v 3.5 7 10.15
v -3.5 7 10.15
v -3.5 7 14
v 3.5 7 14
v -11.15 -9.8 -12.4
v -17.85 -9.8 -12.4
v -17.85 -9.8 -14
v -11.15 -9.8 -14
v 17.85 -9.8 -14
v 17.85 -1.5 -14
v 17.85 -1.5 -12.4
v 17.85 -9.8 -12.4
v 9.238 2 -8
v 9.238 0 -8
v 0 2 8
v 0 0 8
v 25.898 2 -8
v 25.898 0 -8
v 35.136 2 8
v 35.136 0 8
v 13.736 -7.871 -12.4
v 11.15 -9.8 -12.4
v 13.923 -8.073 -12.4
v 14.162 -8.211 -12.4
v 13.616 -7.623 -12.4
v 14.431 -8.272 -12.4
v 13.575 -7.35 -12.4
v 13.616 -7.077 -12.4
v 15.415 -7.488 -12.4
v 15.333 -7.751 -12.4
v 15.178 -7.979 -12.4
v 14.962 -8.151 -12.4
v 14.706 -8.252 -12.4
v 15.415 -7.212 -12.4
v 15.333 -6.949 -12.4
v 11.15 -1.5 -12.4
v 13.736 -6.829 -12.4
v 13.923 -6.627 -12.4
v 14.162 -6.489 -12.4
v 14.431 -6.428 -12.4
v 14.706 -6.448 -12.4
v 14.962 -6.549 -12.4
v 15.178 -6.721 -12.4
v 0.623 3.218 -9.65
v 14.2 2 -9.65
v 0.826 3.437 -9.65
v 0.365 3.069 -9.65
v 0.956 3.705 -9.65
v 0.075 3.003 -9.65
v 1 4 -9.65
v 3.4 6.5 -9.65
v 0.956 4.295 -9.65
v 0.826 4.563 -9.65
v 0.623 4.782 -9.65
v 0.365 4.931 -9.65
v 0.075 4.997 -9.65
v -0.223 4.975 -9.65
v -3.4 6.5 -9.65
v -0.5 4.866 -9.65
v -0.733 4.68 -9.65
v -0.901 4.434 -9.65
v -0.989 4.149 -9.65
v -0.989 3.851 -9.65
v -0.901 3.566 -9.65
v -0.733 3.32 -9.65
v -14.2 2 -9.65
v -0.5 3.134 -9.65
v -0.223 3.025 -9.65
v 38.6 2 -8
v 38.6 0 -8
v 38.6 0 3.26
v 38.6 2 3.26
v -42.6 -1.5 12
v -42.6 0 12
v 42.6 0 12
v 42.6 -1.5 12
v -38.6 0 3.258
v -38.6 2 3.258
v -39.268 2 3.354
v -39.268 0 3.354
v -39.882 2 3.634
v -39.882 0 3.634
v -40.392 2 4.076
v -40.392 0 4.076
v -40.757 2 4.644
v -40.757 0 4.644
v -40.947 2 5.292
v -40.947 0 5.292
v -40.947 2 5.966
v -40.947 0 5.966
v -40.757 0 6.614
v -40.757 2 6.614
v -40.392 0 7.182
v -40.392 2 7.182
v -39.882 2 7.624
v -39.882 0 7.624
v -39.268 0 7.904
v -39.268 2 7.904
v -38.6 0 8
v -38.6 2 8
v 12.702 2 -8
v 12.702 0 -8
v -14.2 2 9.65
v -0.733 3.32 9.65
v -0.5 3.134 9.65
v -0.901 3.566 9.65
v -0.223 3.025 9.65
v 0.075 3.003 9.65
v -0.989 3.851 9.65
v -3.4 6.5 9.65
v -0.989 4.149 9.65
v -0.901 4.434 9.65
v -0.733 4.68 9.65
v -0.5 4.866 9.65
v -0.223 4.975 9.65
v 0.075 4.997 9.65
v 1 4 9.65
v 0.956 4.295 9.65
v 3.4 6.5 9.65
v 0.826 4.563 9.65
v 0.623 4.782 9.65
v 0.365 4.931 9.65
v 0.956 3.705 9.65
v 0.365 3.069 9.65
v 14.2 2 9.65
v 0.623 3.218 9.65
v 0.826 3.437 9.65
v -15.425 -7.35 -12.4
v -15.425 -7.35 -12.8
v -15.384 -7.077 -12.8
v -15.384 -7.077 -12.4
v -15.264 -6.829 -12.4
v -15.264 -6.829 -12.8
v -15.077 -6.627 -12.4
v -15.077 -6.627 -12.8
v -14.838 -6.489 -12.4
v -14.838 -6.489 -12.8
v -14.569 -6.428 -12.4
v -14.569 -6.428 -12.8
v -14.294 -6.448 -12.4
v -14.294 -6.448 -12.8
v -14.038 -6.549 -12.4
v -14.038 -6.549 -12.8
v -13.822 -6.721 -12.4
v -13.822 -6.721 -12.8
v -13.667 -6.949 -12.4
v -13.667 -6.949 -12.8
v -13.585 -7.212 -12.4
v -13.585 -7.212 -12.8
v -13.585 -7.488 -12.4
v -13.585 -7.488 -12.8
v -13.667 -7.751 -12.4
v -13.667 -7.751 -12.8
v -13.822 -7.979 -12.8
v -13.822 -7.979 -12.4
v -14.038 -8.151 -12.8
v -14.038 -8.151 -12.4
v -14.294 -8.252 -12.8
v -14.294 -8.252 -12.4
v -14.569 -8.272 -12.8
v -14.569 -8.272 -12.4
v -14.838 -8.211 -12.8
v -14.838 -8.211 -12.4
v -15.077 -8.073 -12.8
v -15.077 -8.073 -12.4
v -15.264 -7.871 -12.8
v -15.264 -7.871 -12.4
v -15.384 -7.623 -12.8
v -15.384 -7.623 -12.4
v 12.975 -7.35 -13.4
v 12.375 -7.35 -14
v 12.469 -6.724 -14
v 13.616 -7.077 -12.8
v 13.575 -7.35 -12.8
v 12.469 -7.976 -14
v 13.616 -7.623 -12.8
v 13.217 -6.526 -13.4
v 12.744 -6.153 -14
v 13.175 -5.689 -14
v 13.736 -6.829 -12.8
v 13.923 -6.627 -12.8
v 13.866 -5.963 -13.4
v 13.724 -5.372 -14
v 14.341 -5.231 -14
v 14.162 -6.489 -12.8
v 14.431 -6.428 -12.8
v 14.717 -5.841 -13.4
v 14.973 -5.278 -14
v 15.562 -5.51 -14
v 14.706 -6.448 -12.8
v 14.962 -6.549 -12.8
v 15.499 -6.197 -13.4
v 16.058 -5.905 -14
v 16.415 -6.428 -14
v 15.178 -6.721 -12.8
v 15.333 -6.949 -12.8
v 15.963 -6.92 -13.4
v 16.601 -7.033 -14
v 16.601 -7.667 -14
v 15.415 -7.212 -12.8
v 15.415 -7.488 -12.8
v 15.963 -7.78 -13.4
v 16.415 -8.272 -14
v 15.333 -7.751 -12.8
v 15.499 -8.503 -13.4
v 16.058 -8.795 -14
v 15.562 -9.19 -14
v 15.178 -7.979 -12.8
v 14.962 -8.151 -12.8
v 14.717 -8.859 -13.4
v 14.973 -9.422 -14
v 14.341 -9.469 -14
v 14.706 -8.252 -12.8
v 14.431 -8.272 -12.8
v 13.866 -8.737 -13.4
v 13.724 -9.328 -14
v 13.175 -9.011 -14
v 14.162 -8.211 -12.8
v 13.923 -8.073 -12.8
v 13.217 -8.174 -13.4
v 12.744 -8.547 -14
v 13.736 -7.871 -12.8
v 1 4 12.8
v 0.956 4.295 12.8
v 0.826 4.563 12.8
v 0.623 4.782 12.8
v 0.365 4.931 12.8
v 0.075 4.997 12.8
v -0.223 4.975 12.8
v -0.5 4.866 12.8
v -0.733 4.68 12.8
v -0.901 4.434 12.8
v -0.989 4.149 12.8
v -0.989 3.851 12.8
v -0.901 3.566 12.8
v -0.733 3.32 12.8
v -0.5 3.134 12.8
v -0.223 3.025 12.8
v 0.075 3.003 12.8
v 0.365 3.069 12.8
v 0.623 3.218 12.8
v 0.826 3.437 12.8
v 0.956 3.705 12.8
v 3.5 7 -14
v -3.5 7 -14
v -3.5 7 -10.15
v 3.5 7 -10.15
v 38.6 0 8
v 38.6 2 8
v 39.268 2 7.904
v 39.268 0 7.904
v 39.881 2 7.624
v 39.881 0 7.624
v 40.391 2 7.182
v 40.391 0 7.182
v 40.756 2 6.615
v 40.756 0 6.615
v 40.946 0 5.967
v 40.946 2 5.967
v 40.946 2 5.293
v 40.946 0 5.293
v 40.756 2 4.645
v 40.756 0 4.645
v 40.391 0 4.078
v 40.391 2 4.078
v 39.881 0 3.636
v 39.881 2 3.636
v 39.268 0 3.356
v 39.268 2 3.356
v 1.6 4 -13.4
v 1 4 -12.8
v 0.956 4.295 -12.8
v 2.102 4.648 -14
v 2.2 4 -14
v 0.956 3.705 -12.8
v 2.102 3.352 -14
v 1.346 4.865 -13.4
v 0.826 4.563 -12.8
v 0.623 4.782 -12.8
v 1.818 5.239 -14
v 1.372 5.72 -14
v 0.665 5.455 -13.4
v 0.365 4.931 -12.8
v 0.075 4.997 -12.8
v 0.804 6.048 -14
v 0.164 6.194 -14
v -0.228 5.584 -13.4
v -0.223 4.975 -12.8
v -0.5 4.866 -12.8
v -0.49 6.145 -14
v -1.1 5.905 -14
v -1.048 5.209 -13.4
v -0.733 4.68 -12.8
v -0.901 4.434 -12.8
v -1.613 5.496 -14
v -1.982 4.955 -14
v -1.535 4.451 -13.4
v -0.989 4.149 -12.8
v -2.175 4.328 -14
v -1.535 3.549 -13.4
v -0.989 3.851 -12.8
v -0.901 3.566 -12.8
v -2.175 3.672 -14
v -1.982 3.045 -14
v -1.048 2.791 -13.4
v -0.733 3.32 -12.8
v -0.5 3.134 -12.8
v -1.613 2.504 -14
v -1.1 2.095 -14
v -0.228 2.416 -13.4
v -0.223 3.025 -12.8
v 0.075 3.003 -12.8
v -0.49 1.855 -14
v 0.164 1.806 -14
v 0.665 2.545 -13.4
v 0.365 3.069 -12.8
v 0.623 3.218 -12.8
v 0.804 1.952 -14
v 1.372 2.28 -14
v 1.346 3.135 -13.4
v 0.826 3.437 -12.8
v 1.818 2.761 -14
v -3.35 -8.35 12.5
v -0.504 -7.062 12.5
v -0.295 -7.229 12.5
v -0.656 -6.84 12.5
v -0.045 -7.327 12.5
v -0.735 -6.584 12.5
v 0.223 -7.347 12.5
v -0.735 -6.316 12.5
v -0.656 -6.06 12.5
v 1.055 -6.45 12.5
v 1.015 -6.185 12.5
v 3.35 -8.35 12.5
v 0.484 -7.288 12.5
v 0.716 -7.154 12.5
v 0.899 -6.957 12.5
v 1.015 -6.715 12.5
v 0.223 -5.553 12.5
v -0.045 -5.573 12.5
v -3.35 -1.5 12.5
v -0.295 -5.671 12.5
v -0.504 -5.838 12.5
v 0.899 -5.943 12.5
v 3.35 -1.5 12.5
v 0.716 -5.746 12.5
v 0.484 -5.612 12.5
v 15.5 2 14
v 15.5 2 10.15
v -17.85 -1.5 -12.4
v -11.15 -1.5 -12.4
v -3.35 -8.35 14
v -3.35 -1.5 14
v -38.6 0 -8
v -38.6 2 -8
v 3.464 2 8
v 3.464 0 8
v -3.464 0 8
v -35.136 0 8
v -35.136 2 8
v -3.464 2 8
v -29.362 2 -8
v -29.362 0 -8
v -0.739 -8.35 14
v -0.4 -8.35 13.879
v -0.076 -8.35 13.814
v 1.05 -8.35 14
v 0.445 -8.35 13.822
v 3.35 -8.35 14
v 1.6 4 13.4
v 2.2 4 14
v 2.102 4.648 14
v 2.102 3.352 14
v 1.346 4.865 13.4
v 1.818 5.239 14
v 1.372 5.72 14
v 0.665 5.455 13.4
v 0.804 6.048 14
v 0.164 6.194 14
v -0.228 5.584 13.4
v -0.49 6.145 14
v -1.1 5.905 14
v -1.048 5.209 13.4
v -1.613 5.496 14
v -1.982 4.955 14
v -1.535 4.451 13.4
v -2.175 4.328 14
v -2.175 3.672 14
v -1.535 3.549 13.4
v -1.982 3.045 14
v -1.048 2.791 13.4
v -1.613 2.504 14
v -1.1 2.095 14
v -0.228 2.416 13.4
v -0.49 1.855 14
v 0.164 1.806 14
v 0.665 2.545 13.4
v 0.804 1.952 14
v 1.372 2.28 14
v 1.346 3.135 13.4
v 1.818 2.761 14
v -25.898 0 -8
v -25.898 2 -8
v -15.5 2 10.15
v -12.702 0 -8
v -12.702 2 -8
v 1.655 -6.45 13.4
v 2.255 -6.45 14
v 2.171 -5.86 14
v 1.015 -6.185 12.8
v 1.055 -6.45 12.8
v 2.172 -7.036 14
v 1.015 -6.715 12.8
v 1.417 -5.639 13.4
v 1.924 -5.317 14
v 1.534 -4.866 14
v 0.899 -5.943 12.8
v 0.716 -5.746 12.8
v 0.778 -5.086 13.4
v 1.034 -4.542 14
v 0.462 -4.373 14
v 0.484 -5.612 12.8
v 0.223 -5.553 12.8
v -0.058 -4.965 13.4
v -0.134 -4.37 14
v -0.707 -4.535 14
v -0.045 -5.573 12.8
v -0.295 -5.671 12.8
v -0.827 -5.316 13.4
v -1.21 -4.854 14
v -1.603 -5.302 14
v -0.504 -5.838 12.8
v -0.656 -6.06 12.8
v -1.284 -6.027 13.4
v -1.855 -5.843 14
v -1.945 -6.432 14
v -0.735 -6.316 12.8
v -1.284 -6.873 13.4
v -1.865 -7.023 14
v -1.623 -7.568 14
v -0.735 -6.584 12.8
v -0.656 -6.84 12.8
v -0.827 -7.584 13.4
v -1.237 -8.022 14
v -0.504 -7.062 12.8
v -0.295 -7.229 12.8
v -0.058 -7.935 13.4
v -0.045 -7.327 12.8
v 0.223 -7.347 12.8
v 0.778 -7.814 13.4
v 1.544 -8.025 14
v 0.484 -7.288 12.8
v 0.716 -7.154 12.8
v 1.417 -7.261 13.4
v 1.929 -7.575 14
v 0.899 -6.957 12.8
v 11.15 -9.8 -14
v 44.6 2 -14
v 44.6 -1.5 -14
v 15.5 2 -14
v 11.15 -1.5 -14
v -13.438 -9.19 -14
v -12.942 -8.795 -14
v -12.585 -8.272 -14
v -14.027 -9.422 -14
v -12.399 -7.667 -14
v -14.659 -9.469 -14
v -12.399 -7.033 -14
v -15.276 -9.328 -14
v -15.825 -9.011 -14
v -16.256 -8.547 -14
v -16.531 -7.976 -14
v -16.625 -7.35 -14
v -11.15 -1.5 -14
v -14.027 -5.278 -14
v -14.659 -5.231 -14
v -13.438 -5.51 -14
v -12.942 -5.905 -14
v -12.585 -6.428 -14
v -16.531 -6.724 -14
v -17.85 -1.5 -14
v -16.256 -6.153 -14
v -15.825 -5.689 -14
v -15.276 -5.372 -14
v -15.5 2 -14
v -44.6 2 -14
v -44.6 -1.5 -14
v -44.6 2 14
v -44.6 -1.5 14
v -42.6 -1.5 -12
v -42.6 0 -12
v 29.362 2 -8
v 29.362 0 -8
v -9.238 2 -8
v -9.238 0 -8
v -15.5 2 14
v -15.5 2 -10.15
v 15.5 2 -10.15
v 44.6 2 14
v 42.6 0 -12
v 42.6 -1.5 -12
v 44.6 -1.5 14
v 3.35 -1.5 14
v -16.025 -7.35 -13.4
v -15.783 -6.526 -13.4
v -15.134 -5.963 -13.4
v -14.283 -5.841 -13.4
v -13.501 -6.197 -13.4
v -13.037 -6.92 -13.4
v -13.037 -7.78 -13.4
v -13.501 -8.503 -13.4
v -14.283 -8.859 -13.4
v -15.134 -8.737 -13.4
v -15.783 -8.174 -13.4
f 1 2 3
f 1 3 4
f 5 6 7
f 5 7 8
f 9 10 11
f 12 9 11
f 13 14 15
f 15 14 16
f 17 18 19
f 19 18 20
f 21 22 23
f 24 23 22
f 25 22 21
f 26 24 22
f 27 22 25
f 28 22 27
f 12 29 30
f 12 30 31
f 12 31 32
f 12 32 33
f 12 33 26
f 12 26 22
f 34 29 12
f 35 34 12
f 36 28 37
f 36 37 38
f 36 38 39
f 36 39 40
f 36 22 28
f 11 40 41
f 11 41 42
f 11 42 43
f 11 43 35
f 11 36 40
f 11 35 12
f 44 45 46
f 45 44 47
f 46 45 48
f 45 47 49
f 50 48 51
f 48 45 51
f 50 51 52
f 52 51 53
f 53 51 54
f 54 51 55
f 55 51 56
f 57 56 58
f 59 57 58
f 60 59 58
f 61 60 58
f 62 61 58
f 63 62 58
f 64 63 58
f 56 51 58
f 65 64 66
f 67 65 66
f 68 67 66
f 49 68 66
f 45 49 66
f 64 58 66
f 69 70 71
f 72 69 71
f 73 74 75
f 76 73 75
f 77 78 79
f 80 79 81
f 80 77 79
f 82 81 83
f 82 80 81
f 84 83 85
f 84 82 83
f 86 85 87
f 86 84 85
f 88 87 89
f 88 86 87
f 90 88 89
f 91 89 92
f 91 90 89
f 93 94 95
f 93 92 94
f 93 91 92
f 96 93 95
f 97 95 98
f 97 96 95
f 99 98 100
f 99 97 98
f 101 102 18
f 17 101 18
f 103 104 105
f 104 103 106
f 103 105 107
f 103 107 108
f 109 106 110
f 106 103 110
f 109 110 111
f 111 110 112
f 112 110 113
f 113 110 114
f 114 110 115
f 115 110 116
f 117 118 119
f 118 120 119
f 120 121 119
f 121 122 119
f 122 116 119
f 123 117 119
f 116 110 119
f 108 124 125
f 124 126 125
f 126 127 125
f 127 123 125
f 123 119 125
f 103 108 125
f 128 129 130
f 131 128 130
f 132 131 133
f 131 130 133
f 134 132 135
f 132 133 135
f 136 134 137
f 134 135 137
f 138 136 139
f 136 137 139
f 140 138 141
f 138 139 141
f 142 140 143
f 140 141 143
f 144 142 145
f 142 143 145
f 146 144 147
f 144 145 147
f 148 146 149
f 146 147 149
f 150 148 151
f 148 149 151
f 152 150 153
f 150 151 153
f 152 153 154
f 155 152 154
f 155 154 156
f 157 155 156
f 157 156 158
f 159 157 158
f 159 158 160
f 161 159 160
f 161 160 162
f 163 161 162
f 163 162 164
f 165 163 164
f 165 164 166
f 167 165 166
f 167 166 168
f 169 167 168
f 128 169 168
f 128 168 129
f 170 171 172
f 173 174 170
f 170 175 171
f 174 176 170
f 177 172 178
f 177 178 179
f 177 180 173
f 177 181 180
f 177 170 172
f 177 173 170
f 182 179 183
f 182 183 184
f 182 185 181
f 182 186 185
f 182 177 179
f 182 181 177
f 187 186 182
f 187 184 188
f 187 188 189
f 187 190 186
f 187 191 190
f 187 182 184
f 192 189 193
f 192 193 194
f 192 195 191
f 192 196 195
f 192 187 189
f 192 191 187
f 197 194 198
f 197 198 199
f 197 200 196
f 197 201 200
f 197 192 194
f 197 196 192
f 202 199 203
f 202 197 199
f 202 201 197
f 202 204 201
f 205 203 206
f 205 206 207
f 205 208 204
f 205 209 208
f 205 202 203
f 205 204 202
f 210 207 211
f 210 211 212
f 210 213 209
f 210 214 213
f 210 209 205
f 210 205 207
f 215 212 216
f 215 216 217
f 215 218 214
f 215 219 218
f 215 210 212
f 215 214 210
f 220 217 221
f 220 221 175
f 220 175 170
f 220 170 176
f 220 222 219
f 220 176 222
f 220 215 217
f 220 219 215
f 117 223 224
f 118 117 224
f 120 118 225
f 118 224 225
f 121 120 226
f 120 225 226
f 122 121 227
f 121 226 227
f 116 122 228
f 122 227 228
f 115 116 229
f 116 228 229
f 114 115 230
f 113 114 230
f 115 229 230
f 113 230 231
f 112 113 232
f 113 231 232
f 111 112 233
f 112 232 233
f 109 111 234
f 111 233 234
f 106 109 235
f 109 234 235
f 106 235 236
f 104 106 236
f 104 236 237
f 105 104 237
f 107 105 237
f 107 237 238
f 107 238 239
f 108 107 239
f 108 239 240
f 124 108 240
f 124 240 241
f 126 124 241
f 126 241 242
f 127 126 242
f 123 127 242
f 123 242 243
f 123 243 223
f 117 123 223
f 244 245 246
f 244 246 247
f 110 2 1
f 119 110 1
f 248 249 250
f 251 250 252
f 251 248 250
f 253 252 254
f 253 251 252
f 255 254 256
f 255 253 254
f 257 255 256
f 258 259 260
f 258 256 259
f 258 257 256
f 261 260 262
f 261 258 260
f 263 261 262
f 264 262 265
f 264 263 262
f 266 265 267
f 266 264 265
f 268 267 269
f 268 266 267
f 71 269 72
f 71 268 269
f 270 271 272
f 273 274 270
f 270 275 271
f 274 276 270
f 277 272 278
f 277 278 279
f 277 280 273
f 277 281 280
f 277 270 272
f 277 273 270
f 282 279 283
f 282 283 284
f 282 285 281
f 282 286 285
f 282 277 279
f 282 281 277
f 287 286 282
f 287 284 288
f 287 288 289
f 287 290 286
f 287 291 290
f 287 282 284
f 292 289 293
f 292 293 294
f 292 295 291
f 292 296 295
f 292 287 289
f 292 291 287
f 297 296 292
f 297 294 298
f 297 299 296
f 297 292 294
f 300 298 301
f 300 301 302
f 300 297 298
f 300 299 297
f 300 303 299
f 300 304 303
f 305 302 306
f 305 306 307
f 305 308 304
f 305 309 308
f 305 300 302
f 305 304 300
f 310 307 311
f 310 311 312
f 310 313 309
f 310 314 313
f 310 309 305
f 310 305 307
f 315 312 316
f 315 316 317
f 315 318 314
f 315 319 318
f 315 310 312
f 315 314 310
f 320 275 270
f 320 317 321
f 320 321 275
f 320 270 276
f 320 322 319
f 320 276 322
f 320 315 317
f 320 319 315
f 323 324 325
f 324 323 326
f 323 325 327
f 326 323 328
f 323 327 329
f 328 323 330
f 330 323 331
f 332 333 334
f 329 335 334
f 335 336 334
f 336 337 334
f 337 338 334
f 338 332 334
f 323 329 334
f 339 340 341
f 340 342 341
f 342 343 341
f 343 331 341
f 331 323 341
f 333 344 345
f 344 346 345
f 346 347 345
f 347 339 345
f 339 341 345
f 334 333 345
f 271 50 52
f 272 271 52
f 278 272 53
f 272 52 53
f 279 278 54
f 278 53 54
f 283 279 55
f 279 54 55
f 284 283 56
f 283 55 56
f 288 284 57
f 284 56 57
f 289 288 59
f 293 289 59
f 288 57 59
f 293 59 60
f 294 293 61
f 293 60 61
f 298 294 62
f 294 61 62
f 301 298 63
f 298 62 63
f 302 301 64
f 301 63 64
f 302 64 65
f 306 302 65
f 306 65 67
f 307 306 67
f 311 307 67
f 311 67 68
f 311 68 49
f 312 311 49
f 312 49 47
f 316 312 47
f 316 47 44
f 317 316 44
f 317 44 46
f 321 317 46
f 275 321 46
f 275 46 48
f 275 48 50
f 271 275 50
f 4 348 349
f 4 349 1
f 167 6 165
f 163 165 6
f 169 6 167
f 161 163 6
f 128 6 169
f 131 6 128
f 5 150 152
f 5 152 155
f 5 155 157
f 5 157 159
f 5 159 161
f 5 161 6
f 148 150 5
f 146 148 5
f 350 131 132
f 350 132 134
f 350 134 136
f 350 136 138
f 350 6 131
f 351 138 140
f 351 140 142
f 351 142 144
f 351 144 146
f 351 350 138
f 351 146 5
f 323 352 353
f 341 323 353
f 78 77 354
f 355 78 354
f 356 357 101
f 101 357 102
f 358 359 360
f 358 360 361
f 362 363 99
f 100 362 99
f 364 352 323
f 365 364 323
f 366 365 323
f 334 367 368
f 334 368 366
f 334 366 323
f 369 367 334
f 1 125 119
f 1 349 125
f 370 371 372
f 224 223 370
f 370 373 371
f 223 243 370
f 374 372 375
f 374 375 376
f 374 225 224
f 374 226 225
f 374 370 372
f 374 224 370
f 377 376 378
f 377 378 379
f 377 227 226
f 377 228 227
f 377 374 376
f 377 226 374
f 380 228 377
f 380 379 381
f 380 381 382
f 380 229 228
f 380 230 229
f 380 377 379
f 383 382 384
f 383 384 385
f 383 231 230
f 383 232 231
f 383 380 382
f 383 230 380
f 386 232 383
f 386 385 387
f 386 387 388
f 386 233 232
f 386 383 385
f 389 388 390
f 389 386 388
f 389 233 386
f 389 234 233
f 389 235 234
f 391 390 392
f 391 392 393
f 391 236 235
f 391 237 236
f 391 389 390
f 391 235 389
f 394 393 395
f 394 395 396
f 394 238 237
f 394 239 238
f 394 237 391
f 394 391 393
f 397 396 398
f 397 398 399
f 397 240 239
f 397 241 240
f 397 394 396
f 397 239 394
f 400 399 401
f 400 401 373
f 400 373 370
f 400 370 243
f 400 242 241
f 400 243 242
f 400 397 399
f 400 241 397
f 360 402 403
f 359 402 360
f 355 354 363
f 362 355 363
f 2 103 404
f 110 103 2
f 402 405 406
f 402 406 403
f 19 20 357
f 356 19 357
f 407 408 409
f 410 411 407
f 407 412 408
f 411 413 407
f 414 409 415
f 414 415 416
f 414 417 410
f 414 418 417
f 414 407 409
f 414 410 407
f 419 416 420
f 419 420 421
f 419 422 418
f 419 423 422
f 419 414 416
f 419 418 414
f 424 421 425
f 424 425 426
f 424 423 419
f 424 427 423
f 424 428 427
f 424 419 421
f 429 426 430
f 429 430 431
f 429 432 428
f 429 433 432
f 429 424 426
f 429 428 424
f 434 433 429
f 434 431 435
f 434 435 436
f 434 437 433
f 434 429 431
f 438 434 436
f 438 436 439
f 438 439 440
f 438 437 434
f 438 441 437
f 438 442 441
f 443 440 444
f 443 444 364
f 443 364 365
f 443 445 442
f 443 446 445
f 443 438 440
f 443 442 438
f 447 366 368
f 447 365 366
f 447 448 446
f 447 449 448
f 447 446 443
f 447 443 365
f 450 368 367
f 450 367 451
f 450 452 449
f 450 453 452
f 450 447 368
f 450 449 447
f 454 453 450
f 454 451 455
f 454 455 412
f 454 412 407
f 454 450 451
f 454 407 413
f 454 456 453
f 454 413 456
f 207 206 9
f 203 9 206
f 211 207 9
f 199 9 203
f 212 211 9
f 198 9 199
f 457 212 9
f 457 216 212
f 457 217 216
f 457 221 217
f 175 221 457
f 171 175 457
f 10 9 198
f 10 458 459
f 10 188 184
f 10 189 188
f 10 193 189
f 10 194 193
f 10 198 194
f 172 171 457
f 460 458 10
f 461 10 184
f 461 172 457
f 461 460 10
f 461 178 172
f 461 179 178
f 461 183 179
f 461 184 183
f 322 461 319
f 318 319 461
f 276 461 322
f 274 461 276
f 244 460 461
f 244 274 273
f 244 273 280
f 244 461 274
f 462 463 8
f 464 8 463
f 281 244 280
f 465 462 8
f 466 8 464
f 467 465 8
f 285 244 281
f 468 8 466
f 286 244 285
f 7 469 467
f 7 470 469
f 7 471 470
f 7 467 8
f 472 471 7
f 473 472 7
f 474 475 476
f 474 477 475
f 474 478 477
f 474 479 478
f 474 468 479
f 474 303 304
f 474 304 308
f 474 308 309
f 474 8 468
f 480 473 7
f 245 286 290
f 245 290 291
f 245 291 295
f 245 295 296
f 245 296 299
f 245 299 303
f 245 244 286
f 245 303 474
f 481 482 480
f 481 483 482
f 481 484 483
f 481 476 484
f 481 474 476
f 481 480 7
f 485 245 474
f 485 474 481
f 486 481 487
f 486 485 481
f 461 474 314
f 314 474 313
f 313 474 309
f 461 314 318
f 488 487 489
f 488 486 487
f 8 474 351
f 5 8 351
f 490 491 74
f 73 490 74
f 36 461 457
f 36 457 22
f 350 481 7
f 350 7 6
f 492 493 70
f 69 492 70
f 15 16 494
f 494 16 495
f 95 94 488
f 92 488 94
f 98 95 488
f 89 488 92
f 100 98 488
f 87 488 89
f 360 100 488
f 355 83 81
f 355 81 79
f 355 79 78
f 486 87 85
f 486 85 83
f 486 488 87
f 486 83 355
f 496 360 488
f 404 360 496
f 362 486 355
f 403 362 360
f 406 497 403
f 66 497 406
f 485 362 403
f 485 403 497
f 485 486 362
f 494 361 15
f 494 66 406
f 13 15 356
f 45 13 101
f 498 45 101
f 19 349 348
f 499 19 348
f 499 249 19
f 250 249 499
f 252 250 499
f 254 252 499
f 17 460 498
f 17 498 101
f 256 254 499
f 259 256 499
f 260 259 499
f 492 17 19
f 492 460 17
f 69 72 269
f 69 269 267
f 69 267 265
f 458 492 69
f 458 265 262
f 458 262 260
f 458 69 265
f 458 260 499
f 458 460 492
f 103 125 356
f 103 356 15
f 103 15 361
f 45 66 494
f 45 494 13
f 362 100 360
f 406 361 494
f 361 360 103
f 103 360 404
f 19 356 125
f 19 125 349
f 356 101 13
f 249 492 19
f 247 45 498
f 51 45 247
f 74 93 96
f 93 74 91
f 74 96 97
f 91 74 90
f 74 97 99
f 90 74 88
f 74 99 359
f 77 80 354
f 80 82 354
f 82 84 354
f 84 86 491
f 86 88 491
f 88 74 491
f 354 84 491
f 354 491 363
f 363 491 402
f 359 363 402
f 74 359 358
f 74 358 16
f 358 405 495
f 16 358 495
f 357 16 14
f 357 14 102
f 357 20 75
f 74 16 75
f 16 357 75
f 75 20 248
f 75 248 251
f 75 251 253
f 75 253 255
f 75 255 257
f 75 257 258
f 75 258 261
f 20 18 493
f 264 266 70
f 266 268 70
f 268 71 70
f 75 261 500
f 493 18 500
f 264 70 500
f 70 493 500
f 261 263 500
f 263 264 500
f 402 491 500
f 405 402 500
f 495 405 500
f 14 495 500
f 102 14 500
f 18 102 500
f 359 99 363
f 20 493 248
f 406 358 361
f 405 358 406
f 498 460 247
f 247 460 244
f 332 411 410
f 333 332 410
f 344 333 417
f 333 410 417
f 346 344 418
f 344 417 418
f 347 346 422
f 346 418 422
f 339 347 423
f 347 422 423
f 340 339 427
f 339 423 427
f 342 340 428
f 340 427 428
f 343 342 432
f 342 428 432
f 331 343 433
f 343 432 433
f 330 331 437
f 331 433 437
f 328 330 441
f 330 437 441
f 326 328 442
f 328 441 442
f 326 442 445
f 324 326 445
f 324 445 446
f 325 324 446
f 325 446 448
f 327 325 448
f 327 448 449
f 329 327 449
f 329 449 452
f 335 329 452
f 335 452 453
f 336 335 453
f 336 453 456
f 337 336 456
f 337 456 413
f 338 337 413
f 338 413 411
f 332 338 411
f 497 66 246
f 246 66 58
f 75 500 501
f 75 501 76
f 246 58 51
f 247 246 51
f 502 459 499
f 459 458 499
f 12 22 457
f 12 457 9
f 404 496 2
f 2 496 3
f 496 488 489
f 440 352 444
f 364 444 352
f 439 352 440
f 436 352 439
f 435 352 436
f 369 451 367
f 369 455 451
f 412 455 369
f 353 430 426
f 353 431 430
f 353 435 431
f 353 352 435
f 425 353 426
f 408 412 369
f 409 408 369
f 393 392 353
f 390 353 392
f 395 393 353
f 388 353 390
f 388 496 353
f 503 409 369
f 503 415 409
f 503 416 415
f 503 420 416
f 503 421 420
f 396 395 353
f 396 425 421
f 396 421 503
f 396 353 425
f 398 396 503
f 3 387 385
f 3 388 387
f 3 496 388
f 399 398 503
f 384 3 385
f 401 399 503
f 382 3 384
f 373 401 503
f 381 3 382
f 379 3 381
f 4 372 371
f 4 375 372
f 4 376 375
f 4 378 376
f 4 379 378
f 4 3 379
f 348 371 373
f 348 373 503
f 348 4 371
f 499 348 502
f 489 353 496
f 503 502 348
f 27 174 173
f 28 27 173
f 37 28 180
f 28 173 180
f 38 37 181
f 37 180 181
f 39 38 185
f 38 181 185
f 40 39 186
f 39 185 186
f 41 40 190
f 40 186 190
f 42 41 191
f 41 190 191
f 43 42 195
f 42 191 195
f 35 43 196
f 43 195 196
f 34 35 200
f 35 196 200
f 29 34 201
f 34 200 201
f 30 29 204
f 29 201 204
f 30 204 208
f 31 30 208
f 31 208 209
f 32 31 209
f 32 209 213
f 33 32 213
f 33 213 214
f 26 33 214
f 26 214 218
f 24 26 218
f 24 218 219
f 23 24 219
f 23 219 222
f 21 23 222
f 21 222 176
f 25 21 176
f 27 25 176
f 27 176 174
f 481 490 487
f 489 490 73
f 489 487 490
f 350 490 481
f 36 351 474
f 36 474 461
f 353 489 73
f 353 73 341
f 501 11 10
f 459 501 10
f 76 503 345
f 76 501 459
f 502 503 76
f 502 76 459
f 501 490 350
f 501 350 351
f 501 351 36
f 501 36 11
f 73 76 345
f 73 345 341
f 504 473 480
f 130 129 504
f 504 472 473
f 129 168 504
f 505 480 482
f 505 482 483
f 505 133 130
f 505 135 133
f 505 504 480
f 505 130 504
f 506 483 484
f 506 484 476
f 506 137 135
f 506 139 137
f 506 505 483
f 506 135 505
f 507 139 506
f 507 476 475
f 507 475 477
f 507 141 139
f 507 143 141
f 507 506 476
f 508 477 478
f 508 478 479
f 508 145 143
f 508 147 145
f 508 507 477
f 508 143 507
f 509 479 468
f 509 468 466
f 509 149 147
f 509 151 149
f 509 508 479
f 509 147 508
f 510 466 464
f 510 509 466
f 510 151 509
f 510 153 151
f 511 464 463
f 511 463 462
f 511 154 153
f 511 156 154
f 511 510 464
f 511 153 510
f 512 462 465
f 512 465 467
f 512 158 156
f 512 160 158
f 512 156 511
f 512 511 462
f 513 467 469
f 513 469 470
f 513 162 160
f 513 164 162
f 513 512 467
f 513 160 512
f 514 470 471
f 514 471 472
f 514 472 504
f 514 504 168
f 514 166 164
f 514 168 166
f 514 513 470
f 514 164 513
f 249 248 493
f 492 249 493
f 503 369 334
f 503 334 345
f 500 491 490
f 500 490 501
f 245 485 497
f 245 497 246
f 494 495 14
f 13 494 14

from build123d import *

# Parameters (mm, degrees)
SKETCH1_W           = 89.2
SKETCH1_H           = 28
BOSS_EXTRUDE1_DEPTH = 2
SKETCH3_W           = 89.2
SKETCH3_H           = 28
SKETCH3_W_2         = 85.2
SKETCH3_H_2         = 24
BOSS_EXTRUDE2_DEPTH = 1.5
CUT_EXTRUDE1_REACH  = 48.788
SKETCH5_W           = 7
SKETCH5_H           = 4.35
BOSS_EXTRUDE3_DEPTH = 5
SKETCH6_R           = 1
CUT_EXTRUDE2_DEPTH  = 54.124005873
BOSS_EXTRUDE4_DEPTH = 4.35
BOSS_EXTRUDE5_DEPTH = 4.35
CHAMFER1_SIZE       = 1.2
CHAMFER2_SIZE       = 1.2
SKETCH9_W           = 6.7
SKETCH9_H           = 6.85
BOSS_EXTRUDE6_DEPTH = 1.5
SKETCH15_W          = 6.7
SKETCH15_H          = 1.6
BOSS_EXTRUDE7_DEPTH = 8.3
CUT_EXTRUDE9_REACH  = 55.565
SKETCH16_R          = 0.925
CUT_EXTRUDE11_REACH = 55.565
SKETCH17_R          = 0.9
CHAMFER3_SIZE       = 1.2
CHAMFER4_SIZE       = 1.2
CUT_EXTRUDE12_DEPTH = 48.76190951
CHAMFER5_SIZE       = 0.5
CHAMFER6_SIZE       = 0.5


with BuildPart() as part:
    # Sketch1 → Boss-Extrude1 (new body)
    with BuildSketch(Plane(origin=(0, 0, 0), x_dir=(1, 0, 0), z_dir=(0, 1, 0))):
        Rectangle(SKETCH1_W, SKETCH1_H)
    extrude(amount=BOSS_EXTRUDE1_DEPTH)

    # Sketch3 → Boss-Extrude2 (add)
    with BuildSketch(Plane.XZ):
        Rectangle(SKETCH3_W, SKETCH3_H)
        Rectangle(SKETCH3_W_2, SKETCH3_H_2, mode=Mode.SUBTRACT)
    extrude(amount=BOSS_EXTRUDE2_DEPTH)

    # Sketch4 → Cut-Extrude1 (cut, up to next)
    with BuildSketch(Plane.XZ, mode=Mode.PRIVATE) as cut_extrude1_sk1:
        Polygon((38.6, -8), (38.6, 8), (29.362395693, -8), align=None)
    cut_extrude1_tool1 = extrude(cut_extrude1_sk1.sketch, amount=-CUT_EXTRUDE1_REACH, mode=Mode.PRIVATE) & part.part
    # Sketch4 → Cut-Extrude1 (cut, up to next)
    with BuildSketch(Plane.XZ, mode=Mode.PRIVATE) as cut_extrude1_sk2:
        Polygon((35.135898385, 8), (3.464101615, 8), (12.701705922, -8), (25.898294078, -8), align=None)
    cut_extrude1_tool2 = extrude(cut_extrude1_sk2.sketch, amount=-CUT_EXTRUDE1_REACH, mode=Mode.PRIVATE) & part.part
    # Sketch4 → Cut-Extrude1 (cut, up to next)
    with BuildSketch(Plane.XZ, mode=Mode.PRIVATE) as cut_extrude1_sk3:
        Polygon((-38.6, 8), (-38.6, -8), (-29.362395693, -8), align=None)
    cut_extrude1_tool3 = extrude(cut_extrude1_sk3.sketch, amount=-CUT_EXTRUDE1_REACH, mode=Mode.PRIVATE) & part.part
    # Sketch4 → Cut-Extrude1 (cut, up to next)
    with BuildSketch(Plane.XZ, mode=Mode.PRIVATE) as cut_extrude1_sk4:
        Polygon((0, 8), (-9.237604307, -8), (9.237604307, -8), align=None)
    cut_extrude1_tool4 = extrude(cut_extrude1_sk4.sketch, amount=-CUT_EXTRUDE1_REACH, mode=Mode.PRIVATE) & part.part
    # Sketch4 → Cut-Extrude1 (cut, up to next)
    with BuildSketch(Plane.XZ, mode=Mode.PRIVATE) as cut_extrude1_sk5:
        Polygon((-3.464101615, 8), (-12.701705922, -8), (-25.898294078, -8), (-35.135898385, 8), align=None)
    cut_extrude1_tool5 = extrude(cut_extrude1_sk5.sketch, amount=-CUT_EXTRUDE1_REACH, mode=Mode.PRIVATE) & part.part
    add(cut_extrude1_tool1.solids().sort_by_distance((35.520799, 0, -2.666667))[0], mode=Mode.SUBTRACT)
    add(cut_extrude1_tool2.solids().sort_by_distance((19.3, 0, 1.098039))[0], mode=Mode.SUBTRACT)
    add(cut_extrude1_tool3.solids().sort_by_distance((-35.520799, 0, -2.666667))[0], mode=Mode.SUBTRACT)
    add(cut_extrude1_tool4.solids().sort_by_distance((0, 0, -2.666667))[0], mode=Mode.SUBTRACT)
    add(cut_extrude1_tool5.solids().sort_by_distance((-19.3, 0, 1.098039))[0], mode=Mode.SUBTRACT)

    # Sketch5 → Boss-Extrude3 (add)
    with BuildSketch(Plane(origin=(0, 2, 0), x_dir=(1, 0, 0), z_dir=(0, 1, 0))):
        with Locations((0, 11.825)):
            Rectangle(SKETCH5_W, SKETCH5_H)
        with Locations((0, -11.825)):
            Rectangle(SKETCH5_W, SKETCH5_H)
    extrude(amount=BOSS_EXTRUDE3_DEPTH)

    # Sketch6 → Cut-Extrude2 (cut, through all)
    with BuildSketch(Plane.XY.offset(14)):
        with Locations((0, 4)):
            Circle(SKETCH6_R)
    extrude(amount=-CUT_EXTRUDE2_DEPTH, mode=Mode.SUBTRACT)

    # Sketch7 → Boss-Extrude4 (add)
    with BuildSketch(Plane.XY.offset(14)):
        Polygon((3.5, 7), (3.5, 2), (15.5, 2), align=None)
        Polygon((-3.5, 7), (-3.5, 2), (-15.5, 2), align=None)
    extrude(amount=-BOSS_EXTRUDE4_DEPTH)

    # Sketch8 → Boss-Extrude5 (add)
    with BuildSketch(Plane(origin=(0, 0, -14), x_dir=(-1, 0, 0), z_dir=(0, 0, -1))):
        Polygon((3.5, 7), (3.5, 2), (15.5, 2), align=None)
        Polygon((-3.5, 7), (-3.5, 2), (-15.5, 2), align=None)
    extrude(amount=-BOSS_EXTRUDE5_DEPTH)

    # Chamfer1
    chamfer1_edges = [part.edges().sort_by_distance(p)[0] for p in [
        (-1, 4, -14),
    ]]
    chamfer(chamfer1_edges, length=CHAMFER1_SIZE)

    # Chamfer2
    chamfer2_edges = [part.edges().sort_by_distance(p)[0] for p in [
        (-1, 4, 14),
    ]]
    chamfer(chamfer2_edges, length=CHAMFER2_SIZE)

    # Sketch9 → Boss-Extrude6 (add)
    with BuildSketch(Plane.XY.offset(14)):
        with Locations((0, -4.925)):
            Rectangle(SKETCH9_W, SKETCH9_H)
    extrude(amount=-BOSS_EXTRUDE6_DEPTH)

    # Sketch15 → Boss-Extrude7 (add)
    with BuildSketch(Plane.XZ.offset(1.5)):
        with Locations((14.5, -13.2)):
            Rectangle(SKETCH15_W, SKETCH15_H)
        with Locations((-14.5, -13.2)):
            Rectangle(SKETCH15_W, SKETCH15_H)
    extrude(amount=BOSS_EXTRUDE7_DEPTH)

    # Sketch16 → Cut-Extrude9 (cut, up to next)
    with BuildSketch(Plane(origin=(0, 0, -14), x_dir=(-1, 0, 0), z_dir=(0, 0, -1)), mode=Mode.PRIVATE) as cut_extrude9_sk1:
        with Locations((14.5, -7.35)):
            Circle(SKETCH16_R)
    cut_extrude9_tool1 = extrude(cut_extrude9_sk1.sketch, amount=-CUT_EXTRUDE9_REACH, mode=Mode.PRIVATE) & part.part
    # Sketch16 → Cut-Extrude9 (cut, up to next)
    with BuildSketch(Plane(origin=(0, 0, -14), x_dir=(-1, 0, 0), z_dir=(0, 0, -1)), mode=Mode.PRIVATE) as cut_extrude9_sk2:
        with Locations((-14.5, -7.35)):
            Circle(SKETCH16_R)
    cut_extrude9_tool2 = extrude(cut_extrude9_sk2.sketch, amount=-CUT_EXTRUDE9_REACH, mode=Mode.PRIVATE) & part.part
    add(cut_extrude9_tool1.solids().sort_by_distance((-14.5, -7.35, -14))[0], mode=Mode.SUBTRACT)
    add(cut_extrude9_tool2.solids().sort_by_distance((14.5, -7.35, -14))[0], mode=Mode.SUBTRACT)

    # Sketch17 → Cut-Extrude11 (cut, up to next)
    with BuildSketch(Plane.XY.offset(14), mode=Mode.PRIVATE) as cut_extrude11_sk1:
        with Locations((0.155335946, -6.45)):
            Circle(SKETCH17_R)
    cut_extrude11_tool1 = extrude(cut_extrude11_sk1.sketch, amount=-CUT_EXTRUDE11_REACH, mode=Mode.PRIVATE) & part.part
    add(cut_extrude11_tool1.solids().sort_by_distance((0.155336, -6.45, 14))[0], mode=Mode.SUBTRACT)

    # Chamfer3
    # the kernel refuses this chamfer: 1.2 mm, written as the material it takes off along each edge
    with BuildSketch(Plane(origin=(0.155335946, -6.45, 14), x_dir=(1, 0, 0), z_dir=(0, -1, 0))) as chamfer3_piece_1:
        Polygon((0.9 + CHAMFER3_SIZE, 0), (0.9, -CHAMFER3_SIZE), (0.9, 0), align=None)
    revolve(axis=Axis((0.155335946, -6.45, 14), (0, 0, 1)), mode=Mode.SUBTRACT)

    # Chamfer4
    chamfer4_edges = [part.edges().sort_by_distance(p)[0] for p in [
        (-13.575, -7.35, -14),
        (15.425, -7.35, -14),
    ]]
    chamfer(chamfer4_edges, length=CHAMFER4_SIZE)

    # Sketch18 → Cut-Extrude12 (cut, through all)
    with BuildSketch(Plane.XZ):
        with BuildLine():
            Line((38.6, 3.26), (38.6, 8))
            ThreePointArc((38.6, 8), (40.97, 5.63), (38.6, 3.26))
        make_face()
        with BuildLine():
            Line((-38.6, 8), (-38.6, 3.257907009))
            ThreePointArc((-38.6, 3.257907009), (-40.971046495, 5.628953505), (-38.6, 8))
        make_face()
    extrude(amount=-CUT_EXTRUDE12_DEPTH, mode=Mode.SUBTRACT)

    # Chamfer5
    chamfer5_edges = [part.edges().sort_by_distance(p)[0] for p in [
        (0, 7, -9.65),
        (-9.5, 4.5, -9.65),
        (9.5, 4.5, -9.65),
    ]]
    chamfer(chamfer5_edges, length=CHAMFER5_SIZE)

    # Chamfer6
    chamfer6_edges = [part.edges().sort_by_distance(p)[0] for p in [
        (0, 7, 9.65),
        (9.5, 4.5, 9.65),
        (-9.5, 4.5, 9.65),
    ]]
    chamfer(chamfer6_edges, length=CHAMFER6_SIZE)


solid = part.part
